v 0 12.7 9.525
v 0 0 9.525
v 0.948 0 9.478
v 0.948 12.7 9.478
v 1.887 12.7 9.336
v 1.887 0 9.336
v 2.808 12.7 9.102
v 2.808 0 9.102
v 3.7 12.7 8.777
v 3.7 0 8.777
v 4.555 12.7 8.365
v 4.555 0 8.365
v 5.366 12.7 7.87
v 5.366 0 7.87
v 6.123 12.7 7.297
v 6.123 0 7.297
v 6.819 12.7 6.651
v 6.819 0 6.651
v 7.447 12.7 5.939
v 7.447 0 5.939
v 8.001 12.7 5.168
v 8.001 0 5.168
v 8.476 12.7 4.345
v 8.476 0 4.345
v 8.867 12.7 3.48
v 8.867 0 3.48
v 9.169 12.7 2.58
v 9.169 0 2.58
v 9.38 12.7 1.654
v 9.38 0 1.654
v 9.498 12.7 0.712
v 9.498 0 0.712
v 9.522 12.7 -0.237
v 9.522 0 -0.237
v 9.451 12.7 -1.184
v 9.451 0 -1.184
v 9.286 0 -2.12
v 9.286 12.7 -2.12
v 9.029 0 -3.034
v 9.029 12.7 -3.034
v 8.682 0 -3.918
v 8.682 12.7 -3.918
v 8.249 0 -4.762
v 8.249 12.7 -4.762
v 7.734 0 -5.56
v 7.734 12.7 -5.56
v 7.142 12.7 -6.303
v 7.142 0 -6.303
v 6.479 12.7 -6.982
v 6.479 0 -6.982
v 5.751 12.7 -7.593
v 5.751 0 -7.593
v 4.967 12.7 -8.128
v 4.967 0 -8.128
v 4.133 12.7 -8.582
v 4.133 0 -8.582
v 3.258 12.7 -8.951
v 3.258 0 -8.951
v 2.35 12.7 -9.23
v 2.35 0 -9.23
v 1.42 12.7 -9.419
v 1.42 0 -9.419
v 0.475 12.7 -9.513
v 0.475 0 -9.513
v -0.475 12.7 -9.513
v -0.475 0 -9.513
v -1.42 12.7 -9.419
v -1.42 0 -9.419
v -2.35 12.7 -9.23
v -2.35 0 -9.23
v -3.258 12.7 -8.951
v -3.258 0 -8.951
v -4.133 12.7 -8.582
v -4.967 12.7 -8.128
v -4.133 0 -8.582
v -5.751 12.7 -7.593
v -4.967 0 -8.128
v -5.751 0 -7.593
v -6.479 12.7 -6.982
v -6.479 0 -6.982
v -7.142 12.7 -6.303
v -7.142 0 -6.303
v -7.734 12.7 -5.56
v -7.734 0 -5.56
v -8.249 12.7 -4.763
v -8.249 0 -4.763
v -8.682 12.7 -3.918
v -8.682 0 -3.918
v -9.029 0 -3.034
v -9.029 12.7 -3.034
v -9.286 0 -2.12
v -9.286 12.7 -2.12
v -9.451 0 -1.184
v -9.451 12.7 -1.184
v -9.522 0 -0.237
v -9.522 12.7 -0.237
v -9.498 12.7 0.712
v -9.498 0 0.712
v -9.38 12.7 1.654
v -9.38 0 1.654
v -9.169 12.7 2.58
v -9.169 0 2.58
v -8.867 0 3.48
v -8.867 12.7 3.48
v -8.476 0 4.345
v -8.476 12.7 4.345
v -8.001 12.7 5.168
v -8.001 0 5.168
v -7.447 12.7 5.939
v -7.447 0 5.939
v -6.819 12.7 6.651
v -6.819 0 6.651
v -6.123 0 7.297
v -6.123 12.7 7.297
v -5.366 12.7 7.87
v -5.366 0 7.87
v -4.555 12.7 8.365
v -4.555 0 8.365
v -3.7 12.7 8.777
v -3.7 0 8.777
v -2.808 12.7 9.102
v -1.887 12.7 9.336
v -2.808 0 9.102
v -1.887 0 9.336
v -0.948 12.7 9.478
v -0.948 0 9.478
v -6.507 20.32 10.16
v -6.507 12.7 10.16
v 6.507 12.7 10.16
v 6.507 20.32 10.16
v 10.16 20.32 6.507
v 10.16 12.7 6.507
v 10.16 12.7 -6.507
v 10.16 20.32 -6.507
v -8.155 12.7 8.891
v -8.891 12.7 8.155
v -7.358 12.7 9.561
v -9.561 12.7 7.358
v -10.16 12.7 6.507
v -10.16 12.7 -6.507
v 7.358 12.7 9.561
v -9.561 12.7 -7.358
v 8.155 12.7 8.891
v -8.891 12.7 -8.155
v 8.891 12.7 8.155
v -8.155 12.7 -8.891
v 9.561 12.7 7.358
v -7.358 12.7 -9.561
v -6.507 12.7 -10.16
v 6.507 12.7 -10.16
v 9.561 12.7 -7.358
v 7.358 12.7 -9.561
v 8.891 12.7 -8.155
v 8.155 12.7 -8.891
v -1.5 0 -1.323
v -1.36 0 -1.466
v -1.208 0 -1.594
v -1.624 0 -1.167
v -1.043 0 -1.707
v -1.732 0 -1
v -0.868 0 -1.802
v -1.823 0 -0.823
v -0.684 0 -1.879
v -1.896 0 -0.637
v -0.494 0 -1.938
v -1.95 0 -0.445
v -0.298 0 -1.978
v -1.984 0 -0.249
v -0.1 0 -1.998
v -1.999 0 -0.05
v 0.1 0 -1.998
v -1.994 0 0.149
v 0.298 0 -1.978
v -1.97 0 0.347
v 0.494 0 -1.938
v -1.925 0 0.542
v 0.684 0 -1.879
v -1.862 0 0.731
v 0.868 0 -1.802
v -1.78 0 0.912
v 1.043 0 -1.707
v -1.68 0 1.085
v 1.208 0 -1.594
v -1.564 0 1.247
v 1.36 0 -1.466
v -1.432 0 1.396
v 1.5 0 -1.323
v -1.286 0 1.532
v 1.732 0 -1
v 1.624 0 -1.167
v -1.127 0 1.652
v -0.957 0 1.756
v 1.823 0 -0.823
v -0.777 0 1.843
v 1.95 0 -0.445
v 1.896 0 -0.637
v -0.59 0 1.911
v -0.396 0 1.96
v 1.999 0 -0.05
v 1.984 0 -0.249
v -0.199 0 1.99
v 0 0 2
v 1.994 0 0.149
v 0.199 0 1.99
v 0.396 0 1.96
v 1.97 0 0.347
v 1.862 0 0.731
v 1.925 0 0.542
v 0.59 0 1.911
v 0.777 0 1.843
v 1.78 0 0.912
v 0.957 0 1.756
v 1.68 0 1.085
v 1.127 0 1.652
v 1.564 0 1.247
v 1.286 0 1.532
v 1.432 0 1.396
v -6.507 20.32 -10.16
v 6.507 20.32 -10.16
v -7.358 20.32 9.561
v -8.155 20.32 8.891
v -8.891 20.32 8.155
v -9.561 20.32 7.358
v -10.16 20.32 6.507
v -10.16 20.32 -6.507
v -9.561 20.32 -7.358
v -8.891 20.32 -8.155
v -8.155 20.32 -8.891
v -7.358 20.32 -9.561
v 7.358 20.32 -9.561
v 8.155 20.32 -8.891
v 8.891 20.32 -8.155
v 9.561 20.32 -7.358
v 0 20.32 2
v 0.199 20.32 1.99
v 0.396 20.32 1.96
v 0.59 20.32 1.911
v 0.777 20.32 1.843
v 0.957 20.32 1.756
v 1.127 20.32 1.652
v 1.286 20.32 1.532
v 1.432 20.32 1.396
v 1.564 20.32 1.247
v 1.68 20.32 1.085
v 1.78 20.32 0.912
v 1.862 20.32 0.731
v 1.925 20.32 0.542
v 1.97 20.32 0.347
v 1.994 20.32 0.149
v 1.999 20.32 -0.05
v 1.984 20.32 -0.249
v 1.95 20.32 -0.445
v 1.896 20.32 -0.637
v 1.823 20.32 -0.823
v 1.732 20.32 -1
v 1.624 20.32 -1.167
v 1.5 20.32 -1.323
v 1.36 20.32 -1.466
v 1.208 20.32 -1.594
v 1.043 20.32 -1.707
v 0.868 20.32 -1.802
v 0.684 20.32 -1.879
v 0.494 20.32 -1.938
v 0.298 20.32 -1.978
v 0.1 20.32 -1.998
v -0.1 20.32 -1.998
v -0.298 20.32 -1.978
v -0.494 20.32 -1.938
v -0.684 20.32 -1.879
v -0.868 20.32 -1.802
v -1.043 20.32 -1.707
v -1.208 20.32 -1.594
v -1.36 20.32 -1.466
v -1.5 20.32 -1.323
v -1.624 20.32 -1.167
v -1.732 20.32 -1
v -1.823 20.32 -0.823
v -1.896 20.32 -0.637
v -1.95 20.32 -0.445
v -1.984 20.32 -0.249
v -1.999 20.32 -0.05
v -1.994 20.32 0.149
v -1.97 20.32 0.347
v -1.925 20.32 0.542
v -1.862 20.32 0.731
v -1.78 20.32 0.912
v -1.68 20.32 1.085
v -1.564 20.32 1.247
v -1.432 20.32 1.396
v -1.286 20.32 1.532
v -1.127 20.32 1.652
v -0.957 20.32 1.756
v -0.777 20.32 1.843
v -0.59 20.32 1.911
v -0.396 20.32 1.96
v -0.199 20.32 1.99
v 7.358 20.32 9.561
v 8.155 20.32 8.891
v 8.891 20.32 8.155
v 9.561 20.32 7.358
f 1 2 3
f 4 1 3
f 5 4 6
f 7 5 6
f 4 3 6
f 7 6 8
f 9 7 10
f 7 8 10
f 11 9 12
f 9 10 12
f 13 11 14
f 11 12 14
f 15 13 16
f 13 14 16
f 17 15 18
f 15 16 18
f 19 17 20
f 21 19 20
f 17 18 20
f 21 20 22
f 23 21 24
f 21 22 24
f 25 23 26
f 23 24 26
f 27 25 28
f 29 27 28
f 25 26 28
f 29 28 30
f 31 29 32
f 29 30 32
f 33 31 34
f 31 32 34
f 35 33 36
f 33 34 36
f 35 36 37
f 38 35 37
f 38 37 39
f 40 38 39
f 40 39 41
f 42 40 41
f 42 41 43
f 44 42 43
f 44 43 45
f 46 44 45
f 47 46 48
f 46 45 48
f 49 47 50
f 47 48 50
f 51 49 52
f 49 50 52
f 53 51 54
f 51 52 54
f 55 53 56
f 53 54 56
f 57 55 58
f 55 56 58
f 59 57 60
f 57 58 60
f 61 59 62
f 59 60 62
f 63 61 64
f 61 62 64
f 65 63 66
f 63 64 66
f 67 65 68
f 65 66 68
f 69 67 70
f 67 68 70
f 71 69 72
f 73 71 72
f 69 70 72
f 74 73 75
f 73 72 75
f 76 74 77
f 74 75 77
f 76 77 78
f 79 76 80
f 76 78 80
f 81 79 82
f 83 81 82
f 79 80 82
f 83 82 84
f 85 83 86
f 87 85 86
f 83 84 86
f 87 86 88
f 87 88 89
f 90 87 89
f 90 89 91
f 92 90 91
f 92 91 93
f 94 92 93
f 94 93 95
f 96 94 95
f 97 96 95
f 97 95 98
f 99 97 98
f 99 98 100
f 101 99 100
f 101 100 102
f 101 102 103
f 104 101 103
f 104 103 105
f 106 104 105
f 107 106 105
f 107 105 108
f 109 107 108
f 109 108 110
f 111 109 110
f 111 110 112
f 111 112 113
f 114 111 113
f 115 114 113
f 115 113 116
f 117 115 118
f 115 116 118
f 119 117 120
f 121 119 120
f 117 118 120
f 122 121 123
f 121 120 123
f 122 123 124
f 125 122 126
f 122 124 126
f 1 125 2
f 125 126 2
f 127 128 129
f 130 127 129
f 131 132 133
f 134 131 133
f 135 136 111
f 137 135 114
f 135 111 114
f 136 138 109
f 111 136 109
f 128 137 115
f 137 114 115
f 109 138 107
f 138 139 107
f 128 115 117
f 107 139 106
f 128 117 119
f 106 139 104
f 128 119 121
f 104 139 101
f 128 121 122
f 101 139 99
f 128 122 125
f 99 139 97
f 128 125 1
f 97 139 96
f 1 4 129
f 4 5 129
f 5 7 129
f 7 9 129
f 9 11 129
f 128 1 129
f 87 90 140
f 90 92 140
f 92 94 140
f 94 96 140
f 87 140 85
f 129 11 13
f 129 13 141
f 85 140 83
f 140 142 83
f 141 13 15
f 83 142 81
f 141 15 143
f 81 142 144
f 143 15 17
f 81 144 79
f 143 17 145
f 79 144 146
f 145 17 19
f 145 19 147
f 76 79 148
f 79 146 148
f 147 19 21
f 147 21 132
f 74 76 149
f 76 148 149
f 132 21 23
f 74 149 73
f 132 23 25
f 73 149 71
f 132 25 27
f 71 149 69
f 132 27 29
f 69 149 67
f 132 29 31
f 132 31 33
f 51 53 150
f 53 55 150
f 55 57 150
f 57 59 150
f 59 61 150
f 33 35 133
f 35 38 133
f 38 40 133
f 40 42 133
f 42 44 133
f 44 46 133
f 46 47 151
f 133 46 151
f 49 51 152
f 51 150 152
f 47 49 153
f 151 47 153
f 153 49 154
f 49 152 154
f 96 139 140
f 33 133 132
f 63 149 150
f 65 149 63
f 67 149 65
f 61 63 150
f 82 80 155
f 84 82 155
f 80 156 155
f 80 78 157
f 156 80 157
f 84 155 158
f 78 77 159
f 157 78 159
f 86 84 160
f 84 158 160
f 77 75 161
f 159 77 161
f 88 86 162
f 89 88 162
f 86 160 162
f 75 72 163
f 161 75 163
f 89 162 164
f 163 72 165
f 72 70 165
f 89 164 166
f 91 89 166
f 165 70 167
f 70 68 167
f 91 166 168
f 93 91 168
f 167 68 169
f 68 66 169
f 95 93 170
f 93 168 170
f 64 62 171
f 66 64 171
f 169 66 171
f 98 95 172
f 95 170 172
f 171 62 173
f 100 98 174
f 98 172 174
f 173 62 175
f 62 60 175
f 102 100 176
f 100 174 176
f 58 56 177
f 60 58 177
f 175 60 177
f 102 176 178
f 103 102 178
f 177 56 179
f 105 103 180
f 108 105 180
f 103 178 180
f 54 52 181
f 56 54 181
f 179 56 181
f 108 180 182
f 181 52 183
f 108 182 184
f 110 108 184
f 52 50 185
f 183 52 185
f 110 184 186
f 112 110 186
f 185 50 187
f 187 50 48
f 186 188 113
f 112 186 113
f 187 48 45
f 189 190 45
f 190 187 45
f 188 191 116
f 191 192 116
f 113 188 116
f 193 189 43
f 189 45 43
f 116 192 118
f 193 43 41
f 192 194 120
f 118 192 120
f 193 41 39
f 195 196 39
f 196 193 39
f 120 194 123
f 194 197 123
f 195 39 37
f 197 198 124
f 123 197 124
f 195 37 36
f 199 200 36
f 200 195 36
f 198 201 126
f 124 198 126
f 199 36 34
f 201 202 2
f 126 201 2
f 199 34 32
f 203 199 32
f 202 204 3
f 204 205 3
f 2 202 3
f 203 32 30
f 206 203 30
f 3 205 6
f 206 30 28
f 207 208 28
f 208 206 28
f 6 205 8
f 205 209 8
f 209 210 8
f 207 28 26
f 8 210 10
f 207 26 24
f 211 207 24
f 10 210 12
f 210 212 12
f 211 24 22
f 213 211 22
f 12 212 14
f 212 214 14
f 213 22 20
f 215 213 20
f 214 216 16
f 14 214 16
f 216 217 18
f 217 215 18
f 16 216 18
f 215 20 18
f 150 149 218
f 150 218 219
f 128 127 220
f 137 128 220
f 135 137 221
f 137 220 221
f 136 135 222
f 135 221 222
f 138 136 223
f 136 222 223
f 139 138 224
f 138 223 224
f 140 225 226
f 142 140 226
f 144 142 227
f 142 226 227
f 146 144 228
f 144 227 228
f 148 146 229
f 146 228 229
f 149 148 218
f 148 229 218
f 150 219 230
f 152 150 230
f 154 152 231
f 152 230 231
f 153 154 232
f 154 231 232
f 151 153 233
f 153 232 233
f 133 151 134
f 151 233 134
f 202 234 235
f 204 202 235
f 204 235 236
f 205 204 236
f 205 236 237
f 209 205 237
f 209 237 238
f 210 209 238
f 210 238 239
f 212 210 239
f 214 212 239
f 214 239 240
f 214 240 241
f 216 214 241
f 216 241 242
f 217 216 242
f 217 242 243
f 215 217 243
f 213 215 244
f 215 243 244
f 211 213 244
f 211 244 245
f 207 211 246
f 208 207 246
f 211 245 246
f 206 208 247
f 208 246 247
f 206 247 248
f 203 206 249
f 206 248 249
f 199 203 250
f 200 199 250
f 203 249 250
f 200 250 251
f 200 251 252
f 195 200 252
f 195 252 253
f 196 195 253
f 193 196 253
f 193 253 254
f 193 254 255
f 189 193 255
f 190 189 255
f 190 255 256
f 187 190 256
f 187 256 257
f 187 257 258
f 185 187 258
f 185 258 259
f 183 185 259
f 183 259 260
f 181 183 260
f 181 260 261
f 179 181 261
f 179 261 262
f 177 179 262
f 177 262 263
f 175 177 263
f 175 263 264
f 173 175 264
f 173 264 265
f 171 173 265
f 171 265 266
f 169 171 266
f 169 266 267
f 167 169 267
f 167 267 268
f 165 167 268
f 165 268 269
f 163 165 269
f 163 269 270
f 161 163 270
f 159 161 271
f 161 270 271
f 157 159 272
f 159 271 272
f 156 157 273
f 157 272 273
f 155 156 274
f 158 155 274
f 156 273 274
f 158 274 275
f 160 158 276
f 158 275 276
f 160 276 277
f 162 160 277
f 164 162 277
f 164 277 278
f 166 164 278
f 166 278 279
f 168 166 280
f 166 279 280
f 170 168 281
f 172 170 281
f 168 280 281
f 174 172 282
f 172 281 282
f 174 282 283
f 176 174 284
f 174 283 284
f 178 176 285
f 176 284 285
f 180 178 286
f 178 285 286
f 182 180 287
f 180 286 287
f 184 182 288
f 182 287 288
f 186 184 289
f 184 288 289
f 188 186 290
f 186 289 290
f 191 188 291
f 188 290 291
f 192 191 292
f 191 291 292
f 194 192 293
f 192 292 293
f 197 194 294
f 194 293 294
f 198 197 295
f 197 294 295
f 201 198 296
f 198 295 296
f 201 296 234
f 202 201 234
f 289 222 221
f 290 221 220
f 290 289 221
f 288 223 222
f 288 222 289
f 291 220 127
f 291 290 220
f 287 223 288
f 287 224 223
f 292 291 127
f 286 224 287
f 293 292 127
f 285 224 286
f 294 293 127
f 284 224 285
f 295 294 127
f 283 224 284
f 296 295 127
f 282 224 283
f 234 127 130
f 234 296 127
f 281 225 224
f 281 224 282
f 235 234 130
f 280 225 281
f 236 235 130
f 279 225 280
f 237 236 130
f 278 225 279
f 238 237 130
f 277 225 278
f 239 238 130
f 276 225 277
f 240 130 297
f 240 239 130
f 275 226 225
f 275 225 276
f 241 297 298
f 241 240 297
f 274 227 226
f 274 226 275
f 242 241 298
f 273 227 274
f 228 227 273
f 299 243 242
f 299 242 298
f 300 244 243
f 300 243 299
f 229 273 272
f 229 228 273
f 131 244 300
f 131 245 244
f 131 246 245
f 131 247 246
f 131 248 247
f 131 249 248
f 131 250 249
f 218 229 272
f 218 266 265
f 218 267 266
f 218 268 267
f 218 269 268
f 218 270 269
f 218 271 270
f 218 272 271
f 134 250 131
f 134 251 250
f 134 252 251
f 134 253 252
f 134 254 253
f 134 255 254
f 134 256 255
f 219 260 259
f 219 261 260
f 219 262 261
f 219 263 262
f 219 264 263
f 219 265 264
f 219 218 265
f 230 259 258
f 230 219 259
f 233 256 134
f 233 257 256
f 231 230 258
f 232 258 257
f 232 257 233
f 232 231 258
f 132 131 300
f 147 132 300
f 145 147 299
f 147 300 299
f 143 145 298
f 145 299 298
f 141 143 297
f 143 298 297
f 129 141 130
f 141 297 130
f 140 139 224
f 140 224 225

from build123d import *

# Parameters (mm, degrees)
SKETCH1_R           = 9.525
BOSS_EXTRUDE1_DEPTH = 12.7
SKETCH2_W           = 20.32
SKETCH2_H           = 20.32
BOSS_EXTRUDE2_DEPTH = 7.62
CUT_EXTRUDE2_DEPTH  = 25.886815787
SKETCH5_R           = 2.000000064
CUT_EXTRUDE3_DEPTH  = 25.886815787


with BuildPart() as part:
    # Sketch1 → Boss-Extrude1 (new body)
    with BuildSketch(Plane(origin=(0, 0, 0), x_dir=(1, 0, 0), z_dir=(0, 1, 0))):
        Circle(SKETCH1_R)
    extrude(amount=BOSS_EXTRUDE1_DEPTH)

    # Sketch2 → Boss-Extrude2 (add)
    with BuildSketch(Plane(origin=(0, 12.7, 0), x_dir=(1, 0, 0), z_dir=(0, 1, 0))):
        Rectangle(SKETCH2_W, SKETCH2_H)
    extrude(amount=BOSS_EXTRUDE2_DEPTH)

    # Sketch3 → Cut-Extrude2 (cut, through all)
    with BuildSketch(Plane(origin=(0, 20.32, 0), x_dir=(1, 0, 0), z_dir=(0, 1, 0))):
        with BuildLine():
            Line((-6.506813736, 10.16), (-10.16, 10.16))
            Line((-10.16, 10.16), (-10.16, 6.506813736))
            ThreePointArc((-10.16, 6.506813736), (-8.531243315, 8.531243315), (-6.506813736, 10.16))
        make_face()
        with BuildLine():
            Line((10.16, 10.16), (6.506813736, 10.16))
            ThreePointArc((6.506813736, 10.16), (8.531243315, 8.531243315), (10.16, 6.506813736))
            Line((10.16, 6.506813736), (10.16, 10.16))
        make_face()
        with BuildLine():
            ThreePointArc((-6.506813736, -10.16), (-8.531243315, -8.531243315), (-10.16, -6.506813736))
            Line((-10.16, -6.506813736), (-10.16, -10.16))
            Line((-10.16, -10.16), (-6.506813736, -10.16))
        make_face()
        with BuildLine():
            Line((10.16, -10.16), (10.16, -6.506813736))
            ThreePointArc((10.16, -6.506813736), (8.531243315, -8.531243315), (6.506813736, -10.16))
            Line((6.506813736, -10.16), (10.16, -10.16))
        make_face()
    extrude(amount=-CUT_EXTRUDE2_DEPTH, mode=Mode.SUBTRACT)

    # Sketch5 → Cut-Extrude3 (cut, through all)
    with BuildSketch(Plane(origin=(0, 20.32, 0), x_dir=(1, 0, 0), z_dir=(0, 1, 0))):
        Circle(SKETCH5_R)
    extrude(amount=-CUT_EXTRUDE3_DEPTH, mode=Mode.SUBTRACT)


solid = part.part
